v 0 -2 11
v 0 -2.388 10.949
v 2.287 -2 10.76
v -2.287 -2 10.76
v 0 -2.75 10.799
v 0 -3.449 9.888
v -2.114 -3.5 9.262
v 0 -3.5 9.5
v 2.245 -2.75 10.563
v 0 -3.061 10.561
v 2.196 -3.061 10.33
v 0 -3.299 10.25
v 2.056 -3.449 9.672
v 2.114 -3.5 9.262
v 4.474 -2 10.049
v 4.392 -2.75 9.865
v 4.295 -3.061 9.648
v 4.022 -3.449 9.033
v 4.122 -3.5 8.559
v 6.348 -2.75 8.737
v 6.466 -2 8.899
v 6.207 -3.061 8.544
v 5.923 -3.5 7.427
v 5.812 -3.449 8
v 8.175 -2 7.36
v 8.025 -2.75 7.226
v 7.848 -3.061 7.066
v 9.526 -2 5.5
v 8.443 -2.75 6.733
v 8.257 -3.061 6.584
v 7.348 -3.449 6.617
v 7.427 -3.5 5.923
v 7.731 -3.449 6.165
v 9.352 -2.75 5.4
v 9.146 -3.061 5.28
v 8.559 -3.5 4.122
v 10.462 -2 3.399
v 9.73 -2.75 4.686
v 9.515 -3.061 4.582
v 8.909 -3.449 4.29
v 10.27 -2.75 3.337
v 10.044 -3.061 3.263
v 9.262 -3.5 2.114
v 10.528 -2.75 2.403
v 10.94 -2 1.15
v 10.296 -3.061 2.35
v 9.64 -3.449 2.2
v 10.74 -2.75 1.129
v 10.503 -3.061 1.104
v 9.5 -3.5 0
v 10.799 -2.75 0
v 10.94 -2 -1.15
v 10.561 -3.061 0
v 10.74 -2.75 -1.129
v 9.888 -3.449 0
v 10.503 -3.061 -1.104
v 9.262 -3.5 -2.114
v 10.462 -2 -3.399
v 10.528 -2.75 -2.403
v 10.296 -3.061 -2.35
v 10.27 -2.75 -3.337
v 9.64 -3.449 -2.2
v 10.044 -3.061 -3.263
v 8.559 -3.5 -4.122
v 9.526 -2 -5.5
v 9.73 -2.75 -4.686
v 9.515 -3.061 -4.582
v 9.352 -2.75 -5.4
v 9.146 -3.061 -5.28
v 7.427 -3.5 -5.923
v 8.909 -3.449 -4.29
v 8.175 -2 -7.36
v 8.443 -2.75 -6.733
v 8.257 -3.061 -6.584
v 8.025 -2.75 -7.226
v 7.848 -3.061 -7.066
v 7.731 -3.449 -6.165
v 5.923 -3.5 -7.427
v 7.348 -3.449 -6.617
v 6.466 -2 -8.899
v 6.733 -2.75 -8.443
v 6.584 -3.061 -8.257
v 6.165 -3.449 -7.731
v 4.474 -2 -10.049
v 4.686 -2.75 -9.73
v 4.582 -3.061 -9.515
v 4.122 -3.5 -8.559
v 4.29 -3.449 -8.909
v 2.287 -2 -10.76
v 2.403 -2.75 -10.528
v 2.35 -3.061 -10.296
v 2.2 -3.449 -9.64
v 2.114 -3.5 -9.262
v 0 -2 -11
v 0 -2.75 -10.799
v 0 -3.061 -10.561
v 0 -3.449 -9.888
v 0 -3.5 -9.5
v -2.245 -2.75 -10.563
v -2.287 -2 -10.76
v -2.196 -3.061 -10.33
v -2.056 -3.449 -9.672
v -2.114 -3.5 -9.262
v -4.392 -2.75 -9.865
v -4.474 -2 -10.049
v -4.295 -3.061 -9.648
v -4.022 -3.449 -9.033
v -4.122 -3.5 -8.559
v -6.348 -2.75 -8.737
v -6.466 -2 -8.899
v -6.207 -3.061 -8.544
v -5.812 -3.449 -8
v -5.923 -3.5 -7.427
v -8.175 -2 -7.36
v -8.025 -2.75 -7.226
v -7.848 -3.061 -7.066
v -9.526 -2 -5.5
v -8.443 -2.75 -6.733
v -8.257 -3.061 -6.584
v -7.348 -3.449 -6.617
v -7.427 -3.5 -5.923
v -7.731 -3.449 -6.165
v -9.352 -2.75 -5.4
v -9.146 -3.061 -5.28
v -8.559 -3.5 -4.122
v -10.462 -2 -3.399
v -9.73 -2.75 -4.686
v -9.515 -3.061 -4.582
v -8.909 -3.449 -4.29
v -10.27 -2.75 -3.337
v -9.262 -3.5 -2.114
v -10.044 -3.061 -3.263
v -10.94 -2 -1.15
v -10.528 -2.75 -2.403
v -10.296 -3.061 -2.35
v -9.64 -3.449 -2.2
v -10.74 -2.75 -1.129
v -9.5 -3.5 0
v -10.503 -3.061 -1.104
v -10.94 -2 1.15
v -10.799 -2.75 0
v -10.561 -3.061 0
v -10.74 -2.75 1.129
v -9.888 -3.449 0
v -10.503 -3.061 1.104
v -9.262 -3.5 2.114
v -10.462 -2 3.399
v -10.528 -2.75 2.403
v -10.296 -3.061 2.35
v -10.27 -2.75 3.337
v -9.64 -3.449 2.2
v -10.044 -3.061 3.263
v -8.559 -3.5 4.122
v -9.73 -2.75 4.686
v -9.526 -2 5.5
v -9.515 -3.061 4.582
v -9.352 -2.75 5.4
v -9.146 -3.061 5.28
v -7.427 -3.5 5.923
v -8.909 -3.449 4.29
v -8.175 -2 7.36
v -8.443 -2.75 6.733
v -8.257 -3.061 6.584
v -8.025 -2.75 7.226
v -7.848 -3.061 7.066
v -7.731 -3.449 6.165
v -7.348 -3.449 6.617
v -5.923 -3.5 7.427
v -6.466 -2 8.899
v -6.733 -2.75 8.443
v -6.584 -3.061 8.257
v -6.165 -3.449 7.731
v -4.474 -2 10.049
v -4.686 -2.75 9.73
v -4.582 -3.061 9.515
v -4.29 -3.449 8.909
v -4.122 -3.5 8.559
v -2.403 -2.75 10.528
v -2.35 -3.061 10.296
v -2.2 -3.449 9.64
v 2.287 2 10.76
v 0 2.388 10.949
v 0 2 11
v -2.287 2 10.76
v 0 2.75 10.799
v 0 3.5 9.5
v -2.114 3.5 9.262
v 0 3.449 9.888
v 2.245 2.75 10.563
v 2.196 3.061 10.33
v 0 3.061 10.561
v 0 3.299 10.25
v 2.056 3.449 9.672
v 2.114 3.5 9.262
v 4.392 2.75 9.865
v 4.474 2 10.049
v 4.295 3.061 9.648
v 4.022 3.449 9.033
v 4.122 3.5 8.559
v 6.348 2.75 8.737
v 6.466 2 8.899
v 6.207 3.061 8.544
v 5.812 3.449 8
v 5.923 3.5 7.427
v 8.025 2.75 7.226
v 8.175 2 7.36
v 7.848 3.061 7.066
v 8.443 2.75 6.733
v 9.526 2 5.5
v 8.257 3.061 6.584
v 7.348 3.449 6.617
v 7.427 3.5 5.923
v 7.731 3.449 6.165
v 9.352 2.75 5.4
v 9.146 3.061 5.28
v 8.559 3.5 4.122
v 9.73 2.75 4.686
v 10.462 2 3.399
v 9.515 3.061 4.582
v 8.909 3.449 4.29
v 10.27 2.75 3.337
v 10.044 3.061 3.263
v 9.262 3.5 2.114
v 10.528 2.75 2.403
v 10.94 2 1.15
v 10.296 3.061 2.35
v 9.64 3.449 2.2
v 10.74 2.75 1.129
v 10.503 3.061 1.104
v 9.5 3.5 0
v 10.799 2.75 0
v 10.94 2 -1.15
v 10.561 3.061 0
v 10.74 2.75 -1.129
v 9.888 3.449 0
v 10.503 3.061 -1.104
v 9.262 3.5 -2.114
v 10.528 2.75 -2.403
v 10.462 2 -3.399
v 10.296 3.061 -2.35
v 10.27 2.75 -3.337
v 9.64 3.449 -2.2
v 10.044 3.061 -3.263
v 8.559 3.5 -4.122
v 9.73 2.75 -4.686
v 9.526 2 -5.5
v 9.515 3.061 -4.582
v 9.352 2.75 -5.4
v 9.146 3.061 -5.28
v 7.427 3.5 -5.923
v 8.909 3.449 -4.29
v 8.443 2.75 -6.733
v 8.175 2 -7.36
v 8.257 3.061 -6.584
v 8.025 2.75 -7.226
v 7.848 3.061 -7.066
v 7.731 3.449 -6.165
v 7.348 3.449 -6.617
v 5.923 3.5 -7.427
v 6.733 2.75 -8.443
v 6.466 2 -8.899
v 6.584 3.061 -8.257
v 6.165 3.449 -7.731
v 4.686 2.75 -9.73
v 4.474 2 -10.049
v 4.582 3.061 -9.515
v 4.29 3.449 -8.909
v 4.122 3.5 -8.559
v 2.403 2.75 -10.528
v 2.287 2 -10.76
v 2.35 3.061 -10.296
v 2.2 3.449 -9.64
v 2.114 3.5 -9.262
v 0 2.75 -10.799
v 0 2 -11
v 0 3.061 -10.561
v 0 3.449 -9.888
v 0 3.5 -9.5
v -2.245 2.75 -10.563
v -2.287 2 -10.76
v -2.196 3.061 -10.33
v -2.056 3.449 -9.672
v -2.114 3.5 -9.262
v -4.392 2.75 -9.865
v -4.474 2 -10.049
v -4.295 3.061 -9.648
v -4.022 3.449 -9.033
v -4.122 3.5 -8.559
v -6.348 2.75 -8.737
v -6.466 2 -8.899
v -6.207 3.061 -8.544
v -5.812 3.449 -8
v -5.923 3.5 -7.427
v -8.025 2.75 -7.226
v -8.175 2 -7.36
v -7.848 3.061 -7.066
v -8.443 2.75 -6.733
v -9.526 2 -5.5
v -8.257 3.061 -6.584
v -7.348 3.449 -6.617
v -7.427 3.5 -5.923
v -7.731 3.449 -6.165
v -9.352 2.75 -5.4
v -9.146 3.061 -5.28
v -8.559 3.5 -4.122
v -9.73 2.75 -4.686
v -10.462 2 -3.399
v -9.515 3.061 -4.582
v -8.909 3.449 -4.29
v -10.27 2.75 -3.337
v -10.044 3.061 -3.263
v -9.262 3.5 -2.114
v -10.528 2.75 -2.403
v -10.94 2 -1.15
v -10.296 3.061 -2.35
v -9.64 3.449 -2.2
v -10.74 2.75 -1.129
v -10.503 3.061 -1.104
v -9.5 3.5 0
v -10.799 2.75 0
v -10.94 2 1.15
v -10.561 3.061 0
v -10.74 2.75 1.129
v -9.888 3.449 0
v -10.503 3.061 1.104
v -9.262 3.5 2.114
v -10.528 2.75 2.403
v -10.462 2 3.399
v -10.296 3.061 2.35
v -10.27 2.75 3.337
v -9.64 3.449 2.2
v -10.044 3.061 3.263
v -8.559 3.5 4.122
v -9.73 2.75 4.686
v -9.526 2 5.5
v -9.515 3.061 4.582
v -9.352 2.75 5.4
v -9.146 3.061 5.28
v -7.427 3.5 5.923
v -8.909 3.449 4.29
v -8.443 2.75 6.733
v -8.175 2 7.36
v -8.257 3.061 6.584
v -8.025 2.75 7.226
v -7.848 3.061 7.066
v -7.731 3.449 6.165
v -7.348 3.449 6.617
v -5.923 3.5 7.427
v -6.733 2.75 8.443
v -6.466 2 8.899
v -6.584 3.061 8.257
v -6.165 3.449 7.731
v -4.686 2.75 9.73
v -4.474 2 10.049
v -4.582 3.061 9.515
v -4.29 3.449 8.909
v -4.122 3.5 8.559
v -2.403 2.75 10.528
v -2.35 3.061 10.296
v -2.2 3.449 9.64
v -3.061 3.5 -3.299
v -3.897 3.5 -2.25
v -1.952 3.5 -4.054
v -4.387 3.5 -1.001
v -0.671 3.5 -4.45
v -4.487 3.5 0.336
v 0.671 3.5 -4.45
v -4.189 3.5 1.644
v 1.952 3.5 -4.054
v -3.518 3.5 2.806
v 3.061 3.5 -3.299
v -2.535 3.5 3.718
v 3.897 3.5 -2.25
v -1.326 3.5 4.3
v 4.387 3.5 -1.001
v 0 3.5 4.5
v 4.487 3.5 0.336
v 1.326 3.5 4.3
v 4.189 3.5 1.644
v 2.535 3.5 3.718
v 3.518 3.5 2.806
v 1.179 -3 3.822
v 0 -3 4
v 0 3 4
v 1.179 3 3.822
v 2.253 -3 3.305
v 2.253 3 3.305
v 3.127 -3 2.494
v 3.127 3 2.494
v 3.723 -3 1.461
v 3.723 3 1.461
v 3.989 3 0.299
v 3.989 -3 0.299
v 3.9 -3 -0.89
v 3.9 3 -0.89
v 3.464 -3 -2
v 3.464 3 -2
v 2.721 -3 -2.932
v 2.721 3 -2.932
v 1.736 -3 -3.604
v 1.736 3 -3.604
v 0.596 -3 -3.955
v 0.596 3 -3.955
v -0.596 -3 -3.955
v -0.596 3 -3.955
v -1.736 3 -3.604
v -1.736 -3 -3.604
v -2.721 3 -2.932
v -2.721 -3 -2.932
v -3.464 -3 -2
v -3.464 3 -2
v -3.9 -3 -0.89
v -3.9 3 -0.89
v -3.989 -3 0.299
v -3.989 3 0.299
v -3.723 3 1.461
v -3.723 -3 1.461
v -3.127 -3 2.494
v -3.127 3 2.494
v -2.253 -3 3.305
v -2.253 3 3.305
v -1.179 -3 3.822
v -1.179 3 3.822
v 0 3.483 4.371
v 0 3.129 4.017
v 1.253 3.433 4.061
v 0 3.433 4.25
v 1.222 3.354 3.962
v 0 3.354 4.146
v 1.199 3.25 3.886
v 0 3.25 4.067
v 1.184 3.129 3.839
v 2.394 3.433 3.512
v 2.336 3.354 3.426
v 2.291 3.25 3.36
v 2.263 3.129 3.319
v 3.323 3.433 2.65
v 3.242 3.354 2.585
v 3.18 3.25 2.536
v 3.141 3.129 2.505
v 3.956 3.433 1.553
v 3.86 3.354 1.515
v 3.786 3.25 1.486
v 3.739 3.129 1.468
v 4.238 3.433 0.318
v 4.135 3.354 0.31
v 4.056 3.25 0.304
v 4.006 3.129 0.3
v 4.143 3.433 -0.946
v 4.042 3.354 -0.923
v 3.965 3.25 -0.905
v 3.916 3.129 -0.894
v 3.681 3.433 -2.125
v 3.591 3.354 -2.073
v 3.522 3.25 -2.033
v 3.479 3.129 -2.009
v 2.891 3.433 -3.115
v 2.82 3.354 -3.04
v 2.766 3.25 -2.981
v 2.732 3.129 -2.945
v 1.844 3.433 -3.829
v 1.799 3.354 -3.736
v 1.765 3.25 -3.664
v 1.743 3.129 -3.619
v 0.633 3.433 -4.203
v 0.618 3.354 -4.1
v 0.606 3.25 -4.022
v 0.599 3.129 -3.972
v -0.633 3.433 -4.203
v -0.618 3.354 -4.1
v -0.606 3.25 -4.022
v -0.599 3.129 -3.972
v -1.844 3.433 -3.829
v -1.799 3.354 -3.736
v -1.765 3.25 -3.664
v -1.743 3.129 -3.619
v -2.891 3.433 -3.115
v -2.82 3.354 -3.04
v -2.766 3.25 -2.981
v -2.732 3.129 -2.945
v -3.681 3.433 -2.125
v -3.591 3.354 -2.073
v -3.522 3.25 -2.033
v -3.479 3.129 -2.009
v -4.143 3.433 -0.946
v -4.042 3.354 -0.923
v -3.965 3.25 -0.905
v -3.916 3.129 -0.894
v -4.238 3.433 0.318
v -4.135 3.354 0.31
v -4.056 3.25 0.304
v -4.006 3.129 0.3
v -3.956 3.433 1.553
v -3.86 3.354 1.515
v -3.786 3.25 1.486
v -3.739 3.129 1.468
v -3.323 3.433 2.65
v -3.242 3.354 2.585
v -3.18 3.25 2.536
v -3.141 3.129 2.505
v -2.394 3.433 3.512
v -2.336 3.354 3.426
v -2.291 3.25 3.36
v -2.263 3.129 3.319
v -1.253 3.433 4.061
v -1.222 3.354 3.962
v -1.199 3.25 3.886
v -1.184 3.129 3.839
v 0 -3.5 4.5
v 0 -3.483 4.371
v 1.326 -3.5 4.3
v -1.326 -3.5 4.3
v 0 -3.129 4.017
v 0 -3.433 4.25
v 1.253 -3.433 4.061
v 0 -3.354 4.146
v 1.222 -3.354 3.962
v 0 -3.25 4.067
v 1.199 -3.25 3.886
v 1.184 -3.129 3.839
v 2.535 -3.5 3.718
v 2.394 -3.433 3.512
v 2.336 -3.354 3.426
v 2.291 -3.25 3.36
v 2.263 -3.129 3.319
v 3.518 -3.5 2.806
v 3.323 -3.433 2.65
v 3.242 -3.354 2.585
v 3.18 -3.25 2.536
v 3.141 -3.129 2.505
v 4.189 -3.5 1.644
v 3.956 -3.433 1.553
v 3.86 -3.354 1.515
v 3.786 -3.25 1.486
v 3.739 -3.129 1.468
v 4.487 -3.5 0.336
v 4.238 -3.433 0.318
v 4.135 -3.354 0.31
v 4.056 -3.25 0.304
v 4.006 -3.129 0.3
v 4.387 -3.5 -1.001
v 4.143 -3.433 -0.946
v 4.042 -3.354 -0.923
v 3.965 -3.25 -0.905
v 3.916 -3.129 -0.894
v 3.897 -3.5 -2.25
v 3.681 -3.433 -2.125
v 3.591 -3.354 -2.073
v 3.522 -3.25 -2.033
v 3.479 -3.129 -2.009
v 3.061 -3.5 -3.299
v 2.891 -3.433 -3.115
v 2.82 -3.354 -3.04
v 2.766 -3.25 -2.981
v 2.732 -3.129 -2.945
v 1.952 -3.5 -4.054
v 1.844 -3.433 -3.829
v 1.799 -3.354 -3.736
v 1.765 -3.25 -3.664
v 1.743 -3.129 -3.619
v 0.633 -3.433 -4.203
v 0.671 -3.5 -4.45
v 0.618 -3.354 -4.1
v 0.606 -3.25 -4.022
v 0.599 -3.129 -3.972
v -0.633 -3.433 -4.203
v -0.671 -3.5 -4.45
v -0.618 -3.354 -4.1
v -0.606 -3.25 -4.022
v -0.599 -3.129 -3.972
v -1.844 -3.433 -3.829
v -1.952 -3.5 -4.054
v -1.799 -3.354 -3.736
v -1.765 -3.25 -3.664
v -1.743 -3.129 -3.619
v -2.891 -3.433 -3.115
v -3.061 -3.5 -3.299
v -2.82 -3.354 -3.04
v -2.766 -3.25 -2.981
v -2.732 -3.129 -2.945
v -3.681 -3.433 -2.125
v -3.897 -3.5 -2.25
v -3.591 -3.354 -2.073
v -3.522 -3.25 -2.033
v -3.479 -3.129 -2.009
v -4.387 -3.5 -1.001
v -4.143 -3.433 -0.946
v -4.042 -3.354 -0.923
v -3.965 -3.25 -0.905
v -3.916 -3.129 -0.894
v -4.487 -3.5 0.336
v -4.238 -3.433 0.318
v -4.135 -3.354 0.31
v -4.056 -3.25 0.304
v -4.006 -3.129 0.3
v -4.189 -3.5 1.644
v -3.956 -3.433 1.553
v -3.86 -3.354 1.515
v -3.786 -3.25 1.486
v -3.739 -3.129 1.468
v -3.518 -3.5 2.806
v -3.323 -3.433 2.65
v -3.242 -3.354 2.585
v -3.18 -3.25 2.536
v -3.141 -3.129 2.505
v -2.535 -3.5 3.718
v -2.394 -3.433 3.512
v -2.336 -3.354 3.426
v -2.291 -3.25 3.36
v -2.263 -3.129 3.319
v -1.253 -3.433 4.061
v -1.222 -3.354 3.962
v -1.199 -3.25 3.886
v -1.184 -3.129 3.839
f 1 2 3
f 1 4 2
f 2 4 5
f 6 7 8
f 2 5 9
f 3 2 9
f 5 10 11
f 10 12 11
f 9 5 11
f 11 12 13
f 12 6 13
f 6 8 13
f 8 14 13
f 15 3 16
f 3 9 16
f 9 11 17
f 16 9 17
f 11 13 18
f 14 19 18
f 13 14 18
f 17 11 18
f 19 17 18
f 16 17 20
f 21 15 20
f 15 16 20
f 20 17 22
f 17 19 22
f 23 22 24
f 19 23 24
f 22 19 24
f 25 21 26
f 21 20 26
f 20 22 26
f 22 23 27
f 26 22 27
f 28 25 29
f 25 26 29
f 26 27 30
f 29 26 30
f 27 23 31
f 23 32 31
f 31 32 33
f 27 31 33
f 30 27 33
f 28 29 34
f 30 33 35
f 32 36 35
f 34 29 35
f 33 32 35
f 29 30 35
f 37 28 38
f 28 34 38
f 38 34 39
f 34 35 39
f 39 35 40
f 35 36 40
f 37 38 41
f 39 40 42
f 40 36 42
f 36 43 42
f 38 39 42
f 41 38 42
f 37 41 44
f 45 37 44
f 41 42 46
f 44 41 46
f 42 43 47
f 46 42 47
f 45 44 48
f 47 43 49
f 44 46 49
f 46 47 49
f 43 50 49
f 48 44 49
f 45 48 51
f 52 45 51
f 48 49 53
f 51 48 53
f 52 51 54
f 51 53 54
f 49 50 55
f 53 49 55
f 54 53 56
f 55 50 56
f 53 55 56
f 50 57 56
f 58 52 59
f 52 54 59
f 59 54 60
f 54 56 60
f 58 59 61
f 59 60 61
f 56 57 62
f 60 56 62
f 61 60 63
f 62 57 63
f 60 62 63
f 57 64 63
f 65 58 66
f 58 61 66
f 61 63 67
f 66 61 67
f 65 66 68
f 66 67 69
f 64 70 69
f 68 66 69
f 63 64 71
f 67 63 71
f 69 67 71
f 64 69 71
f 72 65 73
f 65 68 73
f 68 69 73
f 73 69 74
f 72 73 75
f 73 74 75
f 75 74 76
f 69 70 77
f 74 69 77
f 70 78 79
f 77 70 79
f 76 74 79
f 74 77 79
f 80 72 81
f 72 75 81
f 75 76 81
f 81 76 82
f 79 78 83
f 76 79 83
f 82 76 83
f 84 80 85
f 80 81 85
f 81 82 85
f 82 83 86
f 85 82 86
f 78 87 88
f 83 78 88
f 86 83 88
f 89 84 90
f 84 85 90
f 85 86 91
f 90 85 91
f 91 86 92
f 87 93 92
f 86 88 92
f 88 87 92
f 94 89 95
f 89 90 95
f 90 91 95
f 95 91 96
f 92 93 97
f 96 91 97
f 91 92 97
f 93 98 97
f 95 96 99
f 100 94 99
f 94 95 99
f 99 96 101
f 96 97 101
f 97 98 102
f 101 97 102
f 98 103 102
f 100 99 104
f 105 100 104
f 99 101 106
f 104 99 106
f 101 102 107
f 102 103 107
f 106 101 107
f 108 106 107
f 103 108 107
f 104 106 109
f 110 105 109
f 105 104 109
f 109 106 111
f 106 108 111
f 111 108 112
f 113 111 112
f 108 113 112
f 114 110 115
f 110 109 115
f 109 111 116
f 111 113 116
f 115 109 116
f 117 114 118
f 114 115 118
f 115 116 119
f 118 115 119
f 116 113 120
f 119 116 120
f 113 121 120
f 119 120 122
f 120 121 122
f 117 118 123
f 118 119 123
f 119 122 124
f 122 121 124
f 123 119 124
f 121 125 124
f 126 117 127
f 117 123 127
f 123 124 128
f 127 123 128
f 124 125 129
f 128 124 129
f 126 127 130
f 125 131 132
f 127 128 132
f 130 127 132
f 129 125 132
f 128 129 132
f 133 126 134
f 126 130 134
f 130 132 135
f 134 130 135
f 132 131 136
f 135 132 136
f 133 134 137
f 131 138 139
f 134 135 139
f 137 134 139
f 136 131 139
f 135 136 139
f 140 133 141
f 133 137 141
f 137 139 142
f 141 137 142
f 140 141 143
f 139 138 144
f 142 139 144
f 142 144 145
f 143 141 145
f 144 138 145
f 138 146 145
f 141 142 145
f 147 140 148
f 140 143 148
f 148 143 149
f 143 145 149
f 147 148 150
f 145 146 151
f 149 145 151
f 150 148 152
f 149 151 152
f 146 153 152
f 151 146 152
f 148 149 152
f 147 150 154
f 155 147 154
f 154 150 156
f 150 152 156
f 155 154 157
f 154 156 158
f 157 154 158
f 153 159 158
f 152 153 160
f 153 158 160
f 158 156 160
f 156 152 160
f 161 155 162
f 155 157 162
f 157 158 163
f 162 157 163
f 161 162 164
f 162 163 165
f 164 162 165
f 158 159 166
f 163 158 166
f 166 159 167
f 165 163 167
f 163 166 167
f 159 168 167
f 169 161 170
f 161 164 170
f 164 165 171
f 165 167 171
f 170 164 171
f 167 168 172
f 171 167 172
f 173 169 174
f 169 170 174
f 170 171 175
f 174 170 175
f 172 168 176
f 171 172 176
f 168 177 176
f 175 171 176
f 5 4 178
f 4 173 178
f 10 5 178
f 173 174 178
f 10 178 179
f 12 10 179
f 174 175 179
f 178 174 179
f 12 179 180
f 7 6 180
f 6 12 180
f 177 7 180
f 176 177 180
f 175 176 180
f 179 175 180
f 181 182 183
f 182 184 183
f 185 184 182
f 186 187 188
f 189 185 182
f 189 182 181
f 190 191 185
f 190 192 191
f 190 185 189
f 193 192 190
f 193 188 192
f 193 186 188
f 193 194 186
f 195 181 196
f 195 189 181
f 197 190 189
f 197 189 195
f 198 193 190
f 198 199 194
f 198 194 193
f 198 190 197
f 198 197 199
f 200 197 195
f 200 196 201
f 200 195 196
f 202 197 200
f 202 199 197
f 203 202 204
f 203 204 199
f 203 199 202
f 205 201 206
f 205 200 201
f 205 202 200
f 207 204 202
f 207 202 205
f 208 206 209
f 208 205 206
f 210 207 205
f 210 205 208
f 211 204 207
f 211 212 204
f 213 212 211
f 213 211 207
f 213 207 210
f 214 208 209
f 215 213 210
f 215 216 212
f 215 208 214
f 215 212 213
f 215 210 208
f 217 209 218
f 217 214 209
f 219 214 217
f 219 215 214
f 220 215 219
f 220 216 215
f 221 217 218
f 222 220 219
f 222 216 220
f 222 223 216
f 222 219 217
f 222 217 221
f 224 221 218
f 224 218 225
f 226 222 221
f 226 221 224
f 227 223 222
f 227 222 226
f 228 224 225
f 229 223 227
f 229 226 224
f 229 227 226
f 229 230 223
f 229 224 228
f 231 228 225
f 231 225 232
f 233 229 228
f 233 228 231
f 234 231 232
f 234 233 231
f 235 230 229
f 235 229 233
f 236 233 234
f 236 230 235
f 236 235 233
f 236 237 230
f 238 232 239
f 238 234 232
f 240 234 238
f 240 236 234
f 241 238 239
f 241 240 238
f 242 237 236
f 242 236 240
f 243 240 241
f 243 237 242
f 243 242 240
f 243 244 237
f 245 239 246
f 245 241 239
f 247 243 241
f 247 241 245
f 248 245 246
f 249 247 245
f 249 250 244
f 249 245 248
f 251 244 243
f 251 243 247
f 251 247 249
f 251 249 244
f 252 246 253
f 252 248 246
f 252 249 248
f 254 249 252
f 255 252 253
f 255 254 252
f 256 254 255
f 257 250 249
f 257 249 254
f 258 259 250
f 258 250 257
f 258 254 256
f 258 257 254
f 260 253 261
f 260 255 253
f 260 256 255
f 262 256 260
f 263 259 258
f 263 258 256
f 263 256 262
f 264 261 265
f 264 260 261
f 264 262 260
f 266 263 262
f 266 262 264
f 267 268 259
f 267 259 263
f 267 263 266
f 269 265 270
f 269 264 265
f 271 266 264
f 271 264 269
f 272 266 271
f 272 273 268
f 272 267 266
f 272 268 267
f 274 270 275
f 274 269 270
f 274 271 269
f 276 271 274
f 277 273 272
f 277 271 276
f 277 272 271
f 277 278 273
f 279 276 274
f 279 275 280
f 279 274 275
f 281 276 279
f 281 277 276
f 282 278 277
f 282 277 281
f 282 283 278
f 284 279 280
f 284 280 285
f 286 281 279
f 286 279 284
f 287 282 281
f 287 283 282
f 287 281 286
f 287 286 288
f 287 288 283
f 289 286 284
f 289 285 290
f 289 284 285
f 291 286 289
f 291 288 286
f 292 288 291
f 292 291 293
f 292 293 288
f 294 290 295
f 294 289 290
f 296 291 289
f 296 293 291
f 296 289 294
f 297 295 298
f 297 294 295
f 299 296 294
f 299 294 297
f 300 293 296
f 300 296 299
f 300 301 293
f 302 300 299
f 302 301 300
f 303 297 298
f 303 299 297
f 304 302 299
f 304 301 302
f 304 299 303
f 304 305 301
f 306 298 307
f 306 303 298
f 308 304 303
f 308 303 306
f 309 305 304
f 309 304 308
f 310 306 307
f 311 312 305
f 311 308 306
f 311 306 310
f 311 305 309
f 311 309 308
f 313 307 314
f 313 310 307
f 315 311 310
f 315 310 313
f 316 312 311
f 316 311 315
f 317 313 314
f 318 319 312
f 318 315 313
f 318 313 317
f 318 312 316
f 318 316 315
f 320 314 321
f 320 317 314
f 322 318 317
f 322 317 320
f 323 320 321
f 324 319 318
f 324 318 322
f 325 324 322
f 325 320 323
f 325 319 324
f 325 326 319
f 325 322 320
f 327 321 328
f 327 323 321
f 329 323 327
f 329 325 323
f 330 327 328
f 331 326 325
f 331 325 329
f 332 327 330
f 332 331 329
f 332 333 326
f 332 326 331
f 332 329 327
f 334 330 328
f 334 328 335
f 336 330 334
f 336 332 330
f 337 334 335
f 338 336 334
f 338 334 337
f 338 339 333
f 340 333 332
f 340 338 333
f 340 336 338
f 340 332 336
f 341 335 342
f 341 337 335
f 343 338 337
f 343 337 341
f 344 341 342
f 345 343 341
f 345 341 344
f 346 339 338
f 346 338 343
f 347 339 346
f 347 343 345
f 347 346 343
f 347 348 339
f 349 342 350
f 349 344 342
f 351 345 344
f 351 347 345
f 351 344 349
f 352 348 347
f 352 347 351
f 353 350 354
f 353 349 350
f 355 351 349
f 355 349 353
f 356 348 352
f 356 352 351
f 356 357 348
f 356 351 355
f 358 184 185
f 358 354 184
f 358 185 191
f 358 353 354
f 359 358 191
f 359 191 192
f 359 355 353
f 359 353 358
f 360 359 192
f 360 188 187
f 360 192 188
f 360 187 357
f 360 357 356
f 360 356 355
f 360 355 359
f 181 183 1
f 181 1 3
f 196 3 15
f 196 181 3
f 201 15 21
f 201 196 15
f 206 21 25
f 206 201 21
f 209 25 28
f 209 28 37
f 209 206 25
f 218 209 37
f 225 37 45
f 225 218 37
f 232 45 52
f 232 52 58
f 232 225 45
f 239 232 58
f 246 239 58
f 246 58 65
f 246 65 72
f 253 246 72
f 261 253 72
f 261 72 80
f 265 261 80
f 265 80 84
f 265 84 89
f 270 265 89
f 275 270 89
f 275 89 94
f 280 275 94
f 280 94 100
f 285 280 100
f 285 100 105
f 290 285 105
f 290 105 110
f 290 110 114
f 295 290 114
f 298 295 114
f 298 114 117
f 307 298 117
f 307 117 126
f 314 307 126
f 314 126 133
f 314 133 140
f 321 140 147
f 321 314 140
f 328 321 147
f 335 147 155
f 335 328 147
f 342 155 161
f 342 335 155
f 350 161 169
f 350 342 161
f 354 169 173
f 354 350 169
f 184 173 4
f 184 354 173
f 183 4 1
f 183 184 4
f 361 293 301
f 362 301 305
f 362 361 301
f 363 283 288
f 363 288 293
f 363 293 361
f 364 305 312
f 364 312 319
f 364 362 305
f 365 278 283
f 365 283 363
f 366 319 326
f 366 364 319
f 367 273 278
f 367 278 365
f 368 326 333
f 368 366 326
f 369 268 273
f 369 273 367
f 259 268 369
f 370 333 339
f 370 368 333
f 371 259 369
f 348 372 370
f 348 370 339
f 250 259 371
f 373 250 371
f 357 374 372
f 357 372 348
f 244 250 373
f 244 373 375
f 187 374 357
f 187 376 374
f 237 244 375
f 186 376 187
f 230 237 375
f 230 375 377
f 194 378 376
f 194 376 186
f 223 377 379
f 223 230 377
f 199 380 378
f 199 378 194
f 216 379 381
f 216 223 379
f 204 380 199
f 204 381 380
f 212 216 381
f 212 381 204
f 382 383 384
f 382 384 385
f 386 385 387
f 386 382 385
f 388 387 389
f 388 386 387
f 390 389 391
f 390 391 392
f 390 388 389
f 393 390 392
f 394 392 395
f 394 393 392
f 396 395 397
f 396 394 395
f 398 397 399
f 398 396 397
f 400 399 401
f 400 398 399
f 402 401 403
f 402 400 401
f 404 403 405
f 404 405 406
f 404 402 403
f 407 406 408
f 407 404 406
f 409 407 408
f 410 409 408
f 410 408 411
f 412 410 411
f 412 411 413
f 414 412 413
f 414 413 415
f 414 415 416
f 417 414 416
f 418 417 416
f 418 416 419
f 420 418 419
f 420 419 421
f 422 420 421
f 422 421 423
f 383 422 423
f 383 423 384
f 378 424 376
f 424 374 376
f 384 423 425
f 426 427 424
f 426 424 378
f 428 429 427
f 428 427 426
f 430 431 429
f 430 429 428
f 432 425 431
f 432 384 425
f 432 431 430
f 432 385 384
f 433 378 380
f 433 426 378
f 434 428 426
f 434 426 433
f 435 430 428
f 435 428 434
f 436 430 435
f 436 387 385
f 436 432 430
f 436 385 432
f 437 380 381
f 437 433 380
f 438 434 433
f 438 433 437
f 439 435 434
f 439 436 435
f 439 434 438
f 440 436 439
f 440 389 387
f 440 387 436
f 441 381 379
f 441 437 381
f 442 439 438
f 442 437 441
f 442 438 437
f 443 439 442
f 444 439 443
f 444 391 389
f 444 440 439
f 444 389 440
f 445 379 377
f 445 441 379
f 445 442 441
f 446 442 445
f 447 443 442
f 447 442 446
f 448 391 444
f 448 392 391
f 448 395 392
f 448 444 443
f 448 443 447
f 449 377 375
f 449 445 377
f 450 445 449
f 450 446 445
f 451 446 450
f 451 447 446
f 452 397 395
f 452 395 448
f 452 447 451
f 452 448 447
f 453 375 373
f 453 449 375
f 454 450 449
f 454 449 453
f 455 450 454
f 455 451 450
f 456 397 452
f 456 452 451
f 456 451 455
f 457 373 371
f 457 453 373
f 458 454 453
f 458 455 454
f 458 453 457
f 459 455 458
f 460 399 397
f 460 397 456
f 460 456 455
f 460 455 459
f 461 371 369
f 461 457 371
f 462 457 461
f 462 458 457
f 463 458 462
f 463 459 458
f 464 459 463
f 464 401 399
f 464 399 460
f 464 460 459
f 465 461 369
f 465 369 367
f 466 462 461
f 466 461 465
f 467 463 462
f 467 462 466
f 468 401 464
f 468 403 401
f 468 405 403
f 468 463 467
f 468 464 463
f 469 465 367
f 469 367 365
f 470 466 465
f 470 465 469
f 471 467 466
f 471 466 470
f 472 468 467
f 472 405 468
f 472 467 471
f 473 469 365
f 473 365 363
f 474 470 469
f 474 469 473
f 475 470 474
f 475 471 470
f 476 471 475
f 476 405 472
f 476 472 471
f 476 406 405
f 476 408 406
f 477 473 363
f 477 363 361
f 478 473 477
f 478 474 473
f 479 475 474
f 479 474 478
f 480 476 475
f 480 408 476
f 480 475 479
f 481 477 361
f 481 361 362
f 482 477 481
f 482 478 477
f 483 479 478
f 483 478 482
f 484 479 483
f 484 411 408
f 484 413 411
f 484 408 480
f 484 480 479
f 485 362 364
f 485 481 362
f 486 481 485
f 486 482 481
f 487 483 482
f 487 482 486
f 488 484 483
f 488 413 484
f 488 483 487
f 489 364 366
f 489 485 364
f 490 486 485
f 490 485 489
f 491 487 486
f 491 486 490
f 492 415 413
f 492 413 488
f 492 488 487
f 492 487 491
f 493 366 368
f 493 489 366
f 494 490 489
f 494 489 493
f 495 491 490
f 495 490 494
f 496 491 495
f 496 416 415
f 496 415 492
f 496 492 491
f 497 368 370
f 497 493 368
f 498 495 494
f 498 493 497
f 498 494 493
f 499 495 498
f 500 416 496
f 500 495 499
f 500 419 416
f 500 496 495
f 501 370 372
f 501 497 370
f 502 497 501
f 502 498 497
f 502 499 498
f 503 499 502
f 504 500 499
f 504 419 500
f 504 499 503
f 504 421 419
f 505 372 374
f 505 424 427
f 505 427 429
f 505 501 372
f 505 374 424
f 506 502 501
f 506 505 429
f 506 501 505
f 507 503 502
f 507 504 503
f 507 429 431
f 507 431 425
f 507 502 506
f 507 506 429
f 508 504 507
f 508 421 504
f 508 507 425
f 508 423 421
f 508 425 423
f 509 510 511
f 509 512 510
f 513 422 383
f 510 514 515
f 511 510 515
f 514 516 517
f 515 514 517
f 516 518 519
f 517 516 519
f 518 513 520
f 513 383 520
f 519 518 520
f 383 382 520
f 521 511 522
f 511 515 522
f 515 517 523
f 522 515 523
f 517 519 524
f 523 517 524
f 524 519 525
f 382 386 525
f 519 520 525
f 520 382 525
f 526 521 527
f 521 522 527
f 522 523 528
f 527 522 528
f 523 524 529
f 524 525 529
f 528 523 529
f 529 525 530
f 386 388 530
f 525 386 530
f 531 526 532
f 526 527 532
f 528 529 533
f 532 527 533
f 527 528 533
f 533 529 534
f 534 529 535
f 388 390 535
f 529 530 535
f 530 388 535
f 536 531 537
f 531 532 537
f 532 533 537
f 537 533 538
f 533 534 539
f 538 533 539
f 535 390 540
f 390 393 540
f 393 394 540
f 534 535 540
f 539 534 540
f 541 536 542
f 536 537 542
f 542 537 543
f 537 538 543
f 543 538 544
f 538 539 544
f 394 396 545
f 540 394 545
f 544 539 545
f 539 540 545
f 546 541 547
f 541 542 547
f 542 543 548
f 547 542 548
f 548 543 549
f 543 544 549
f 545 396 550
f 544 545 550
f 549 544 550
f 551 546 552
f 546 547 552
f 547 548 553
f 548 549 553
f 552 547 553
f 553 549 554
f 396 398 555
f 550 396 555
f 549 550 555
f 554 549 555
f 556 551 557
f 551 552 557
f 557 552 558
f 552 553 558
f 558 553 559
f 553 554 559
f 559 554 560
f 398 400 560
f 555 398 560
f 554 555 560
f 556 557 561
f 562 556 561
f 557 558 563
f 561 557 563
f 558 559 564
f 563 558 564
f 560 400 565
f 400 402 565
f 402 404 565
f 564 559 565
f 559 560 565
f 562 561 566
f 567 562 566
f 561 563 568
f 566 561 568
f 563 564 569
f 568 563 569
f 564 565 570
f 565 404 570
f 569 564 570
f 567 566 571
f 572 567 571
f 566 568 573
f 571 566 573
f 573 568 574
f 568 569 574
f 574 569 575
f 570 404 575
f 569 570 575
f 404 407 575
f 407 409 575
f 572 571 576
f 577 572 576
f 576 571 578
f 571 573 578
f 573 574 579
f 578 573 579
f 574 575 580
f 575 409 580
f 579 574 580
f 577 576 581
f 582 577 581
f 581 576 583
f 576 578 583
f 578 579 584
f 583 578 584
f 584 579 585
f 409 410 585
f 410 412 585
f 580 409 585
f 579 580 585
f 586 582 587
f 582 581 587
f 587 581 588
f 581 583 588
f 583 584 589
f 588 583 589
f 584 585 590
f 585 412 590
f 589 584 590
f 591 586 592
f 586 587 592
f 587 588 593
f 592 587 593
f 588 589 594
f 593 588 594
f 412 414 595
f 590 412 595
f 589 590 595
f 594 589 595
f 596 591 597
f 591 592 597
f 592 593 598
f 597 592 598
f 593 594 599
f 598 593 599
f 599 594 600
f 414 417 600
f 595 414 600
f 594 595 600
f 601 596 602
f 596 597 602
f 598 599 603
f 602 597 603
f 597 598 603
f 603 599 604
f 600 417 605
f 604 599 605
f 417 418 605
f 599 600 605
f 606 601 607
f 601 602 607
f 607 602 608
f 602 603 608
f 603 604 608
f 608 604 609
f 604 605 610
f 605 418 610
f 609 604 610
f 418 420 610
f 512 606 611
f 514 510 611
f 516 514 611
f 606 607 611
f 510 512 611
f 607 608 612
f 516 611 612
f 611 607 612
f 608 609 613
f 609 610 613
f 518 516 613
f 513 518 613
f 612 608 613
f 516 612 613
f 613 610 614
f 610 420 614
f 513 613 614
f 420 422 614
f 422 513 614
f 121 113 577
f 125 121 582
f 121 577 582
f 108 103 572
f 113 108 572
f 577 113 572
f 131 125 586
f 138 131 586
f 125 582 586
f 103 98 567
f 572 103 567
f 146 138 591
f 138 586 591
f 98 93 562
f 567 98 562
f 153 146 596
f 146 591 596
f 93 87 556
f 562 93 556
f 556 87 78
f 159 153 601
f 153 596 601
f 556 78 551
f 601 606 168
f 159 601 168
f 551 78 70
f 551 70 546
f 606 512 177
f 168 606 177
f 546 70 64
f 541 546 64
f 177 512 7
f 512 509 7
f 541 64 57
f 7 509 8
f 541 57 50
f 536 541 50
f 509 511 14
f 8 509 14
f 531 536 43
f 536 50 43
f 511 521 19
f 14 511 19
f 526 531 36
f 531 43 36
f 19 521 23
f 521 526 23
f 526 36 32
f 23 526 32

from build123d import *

# Parameters (mm, degrees)
SKETCH1_R           = 11
SKETCH1_R_2         = 4
BOSS_EXTRUDE1_DEPTH = 3.5
FILLET1_R           = 1.5
FILLET2_R           = 0.5


with BuildPart() as part:
    # Sketch1 → Boss-Extrude1 (new body, symmetric)
    with BuildSketch(Plane(origin=(0, 0, 0), x_dir=(1, 0, 0), z_dir=(0, 1, 0))):
        with Locations(Location((0, 0, 0), (0, 0, 270))):  # turned: the seam where the file's is
            Circle(SKETCH1_R)
        with Locations(Location((0, 0, 0), (0, 0, 270))):  # turned: the seam where the file's is
            Circle(SKETCH1_R_2, mode=Mode.SUBTRACT)
    extrude(amount=BOSS_EXTRUDE1_DEPTH, both=True)

    # Fillet1
    fillet1_edges = [part.edges().sort_by_distance(p)[0] for p in [
        (0, -3.5, -11),
        (0, 3.5, -11),
    ]]
    fillet(fillet1_edges, radius=FILLET1_R)

    # Fillet2
    fillet2_edges = [part.edges().sort_by_distance(p)[0] for p in [
        (0, -3.5, -4),
        (0, 3.5, -4),
    ]]
    fillet(fillet2_edges, radius=FILLET2_R)


solid = part.part
